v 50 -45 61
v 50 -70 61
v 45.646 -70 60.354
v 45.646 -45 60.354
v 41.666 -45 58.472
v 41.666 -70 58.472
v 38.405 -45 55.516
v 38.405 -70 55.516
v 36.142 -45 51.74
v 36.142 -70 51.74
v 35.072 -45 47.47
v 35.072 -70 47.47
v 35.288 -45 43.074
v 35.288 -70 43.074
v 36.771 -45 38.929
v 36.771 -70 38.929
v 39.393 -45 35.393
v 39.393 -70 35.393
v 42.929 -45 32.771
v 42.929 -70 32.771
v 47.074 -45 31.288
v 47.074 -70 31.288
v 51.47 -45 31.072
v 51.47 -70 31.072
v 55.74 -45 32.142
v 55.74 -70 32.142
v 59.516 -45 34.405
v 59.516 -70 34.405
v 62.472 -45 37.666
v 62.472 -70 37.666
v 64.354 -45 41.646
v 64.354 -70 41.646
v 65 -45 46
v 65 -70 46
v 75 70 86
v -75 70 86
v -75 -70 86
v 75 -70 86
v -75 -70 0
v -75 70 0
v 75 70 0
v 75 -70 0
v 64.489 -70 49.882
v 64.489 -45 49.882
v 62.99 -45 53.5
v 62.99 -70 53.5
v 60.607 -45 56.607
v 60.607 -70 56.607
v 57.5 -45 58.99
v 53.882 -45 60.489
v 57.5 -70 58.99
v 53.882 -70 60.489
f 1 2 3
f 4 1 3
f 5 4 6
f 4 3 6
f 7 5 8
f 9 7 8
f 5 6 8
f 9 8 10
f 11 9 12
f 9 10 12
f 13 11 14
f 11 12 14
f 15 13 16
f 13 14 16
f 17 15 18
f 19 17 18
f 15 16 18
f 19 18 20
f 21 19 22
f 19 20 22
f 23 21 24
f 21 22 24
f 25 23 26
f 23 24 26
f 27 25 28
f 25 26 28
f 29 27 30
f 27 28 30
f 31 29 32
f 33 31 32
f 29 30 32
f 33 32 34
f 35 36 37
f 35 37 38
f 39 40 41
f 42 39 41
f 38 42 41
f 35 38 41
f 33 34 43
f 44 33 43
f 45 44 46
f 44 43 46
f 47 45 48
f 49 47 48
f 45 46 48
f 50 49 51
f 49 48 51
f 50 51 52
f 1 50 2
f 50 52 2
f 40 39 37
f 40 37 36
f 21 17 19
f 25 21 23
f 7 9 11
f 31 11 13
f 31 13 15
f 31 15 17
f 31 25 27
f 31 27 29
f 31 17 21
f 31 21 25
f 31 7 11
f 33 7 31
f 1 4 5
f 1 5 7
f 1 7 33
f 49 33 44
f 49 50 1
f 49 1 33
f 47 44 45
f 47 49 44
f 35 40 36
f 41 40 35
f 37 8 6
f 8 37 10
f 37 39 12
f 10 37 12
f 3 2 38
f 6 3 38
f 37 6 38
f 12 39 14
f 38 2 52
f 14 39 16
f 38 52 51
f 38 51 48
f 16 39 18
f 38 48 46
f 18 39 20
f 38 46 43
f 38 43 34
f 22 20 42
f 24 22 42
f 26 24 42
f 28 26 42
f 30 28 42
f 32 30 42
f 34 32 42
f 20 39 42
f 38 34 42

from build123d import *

# Parameters (mm, degrees)
F0_W     = 150
F0_H     = 140
F1_DEPTH = 86
F3_DEPTH = 25


with BuildPart() as f1:
    # F0 (on Top) → F1 (new body)
    with BuildSketch(Plane.XY):
        Rectangle(F0_W, F0_H)
    extrude(amount=F1_DEPTH)

    # F2 (on face) → F3 (cut)
    with BuildSketch(Plane.XZ.offset(70)):
        with BuildLine():
            ThreePointArc((50, 61), (39.393398, 35.393398), (65, 46))
            Line((65, 46), (50, 46))
            Line((50, 46), (50, 61))
        make_face()
        with BuildLine():
            Line((50, 46), (65, 46))
            ThreePointArc((65, 46), (60.606602, 56.606602), (50, 61))
            Line((50, 61), (50, 46))
        make_face()
    extrude(amount=-F3_DEPTH, mode=Mode.SUBTRACT)


solid = f1.part
